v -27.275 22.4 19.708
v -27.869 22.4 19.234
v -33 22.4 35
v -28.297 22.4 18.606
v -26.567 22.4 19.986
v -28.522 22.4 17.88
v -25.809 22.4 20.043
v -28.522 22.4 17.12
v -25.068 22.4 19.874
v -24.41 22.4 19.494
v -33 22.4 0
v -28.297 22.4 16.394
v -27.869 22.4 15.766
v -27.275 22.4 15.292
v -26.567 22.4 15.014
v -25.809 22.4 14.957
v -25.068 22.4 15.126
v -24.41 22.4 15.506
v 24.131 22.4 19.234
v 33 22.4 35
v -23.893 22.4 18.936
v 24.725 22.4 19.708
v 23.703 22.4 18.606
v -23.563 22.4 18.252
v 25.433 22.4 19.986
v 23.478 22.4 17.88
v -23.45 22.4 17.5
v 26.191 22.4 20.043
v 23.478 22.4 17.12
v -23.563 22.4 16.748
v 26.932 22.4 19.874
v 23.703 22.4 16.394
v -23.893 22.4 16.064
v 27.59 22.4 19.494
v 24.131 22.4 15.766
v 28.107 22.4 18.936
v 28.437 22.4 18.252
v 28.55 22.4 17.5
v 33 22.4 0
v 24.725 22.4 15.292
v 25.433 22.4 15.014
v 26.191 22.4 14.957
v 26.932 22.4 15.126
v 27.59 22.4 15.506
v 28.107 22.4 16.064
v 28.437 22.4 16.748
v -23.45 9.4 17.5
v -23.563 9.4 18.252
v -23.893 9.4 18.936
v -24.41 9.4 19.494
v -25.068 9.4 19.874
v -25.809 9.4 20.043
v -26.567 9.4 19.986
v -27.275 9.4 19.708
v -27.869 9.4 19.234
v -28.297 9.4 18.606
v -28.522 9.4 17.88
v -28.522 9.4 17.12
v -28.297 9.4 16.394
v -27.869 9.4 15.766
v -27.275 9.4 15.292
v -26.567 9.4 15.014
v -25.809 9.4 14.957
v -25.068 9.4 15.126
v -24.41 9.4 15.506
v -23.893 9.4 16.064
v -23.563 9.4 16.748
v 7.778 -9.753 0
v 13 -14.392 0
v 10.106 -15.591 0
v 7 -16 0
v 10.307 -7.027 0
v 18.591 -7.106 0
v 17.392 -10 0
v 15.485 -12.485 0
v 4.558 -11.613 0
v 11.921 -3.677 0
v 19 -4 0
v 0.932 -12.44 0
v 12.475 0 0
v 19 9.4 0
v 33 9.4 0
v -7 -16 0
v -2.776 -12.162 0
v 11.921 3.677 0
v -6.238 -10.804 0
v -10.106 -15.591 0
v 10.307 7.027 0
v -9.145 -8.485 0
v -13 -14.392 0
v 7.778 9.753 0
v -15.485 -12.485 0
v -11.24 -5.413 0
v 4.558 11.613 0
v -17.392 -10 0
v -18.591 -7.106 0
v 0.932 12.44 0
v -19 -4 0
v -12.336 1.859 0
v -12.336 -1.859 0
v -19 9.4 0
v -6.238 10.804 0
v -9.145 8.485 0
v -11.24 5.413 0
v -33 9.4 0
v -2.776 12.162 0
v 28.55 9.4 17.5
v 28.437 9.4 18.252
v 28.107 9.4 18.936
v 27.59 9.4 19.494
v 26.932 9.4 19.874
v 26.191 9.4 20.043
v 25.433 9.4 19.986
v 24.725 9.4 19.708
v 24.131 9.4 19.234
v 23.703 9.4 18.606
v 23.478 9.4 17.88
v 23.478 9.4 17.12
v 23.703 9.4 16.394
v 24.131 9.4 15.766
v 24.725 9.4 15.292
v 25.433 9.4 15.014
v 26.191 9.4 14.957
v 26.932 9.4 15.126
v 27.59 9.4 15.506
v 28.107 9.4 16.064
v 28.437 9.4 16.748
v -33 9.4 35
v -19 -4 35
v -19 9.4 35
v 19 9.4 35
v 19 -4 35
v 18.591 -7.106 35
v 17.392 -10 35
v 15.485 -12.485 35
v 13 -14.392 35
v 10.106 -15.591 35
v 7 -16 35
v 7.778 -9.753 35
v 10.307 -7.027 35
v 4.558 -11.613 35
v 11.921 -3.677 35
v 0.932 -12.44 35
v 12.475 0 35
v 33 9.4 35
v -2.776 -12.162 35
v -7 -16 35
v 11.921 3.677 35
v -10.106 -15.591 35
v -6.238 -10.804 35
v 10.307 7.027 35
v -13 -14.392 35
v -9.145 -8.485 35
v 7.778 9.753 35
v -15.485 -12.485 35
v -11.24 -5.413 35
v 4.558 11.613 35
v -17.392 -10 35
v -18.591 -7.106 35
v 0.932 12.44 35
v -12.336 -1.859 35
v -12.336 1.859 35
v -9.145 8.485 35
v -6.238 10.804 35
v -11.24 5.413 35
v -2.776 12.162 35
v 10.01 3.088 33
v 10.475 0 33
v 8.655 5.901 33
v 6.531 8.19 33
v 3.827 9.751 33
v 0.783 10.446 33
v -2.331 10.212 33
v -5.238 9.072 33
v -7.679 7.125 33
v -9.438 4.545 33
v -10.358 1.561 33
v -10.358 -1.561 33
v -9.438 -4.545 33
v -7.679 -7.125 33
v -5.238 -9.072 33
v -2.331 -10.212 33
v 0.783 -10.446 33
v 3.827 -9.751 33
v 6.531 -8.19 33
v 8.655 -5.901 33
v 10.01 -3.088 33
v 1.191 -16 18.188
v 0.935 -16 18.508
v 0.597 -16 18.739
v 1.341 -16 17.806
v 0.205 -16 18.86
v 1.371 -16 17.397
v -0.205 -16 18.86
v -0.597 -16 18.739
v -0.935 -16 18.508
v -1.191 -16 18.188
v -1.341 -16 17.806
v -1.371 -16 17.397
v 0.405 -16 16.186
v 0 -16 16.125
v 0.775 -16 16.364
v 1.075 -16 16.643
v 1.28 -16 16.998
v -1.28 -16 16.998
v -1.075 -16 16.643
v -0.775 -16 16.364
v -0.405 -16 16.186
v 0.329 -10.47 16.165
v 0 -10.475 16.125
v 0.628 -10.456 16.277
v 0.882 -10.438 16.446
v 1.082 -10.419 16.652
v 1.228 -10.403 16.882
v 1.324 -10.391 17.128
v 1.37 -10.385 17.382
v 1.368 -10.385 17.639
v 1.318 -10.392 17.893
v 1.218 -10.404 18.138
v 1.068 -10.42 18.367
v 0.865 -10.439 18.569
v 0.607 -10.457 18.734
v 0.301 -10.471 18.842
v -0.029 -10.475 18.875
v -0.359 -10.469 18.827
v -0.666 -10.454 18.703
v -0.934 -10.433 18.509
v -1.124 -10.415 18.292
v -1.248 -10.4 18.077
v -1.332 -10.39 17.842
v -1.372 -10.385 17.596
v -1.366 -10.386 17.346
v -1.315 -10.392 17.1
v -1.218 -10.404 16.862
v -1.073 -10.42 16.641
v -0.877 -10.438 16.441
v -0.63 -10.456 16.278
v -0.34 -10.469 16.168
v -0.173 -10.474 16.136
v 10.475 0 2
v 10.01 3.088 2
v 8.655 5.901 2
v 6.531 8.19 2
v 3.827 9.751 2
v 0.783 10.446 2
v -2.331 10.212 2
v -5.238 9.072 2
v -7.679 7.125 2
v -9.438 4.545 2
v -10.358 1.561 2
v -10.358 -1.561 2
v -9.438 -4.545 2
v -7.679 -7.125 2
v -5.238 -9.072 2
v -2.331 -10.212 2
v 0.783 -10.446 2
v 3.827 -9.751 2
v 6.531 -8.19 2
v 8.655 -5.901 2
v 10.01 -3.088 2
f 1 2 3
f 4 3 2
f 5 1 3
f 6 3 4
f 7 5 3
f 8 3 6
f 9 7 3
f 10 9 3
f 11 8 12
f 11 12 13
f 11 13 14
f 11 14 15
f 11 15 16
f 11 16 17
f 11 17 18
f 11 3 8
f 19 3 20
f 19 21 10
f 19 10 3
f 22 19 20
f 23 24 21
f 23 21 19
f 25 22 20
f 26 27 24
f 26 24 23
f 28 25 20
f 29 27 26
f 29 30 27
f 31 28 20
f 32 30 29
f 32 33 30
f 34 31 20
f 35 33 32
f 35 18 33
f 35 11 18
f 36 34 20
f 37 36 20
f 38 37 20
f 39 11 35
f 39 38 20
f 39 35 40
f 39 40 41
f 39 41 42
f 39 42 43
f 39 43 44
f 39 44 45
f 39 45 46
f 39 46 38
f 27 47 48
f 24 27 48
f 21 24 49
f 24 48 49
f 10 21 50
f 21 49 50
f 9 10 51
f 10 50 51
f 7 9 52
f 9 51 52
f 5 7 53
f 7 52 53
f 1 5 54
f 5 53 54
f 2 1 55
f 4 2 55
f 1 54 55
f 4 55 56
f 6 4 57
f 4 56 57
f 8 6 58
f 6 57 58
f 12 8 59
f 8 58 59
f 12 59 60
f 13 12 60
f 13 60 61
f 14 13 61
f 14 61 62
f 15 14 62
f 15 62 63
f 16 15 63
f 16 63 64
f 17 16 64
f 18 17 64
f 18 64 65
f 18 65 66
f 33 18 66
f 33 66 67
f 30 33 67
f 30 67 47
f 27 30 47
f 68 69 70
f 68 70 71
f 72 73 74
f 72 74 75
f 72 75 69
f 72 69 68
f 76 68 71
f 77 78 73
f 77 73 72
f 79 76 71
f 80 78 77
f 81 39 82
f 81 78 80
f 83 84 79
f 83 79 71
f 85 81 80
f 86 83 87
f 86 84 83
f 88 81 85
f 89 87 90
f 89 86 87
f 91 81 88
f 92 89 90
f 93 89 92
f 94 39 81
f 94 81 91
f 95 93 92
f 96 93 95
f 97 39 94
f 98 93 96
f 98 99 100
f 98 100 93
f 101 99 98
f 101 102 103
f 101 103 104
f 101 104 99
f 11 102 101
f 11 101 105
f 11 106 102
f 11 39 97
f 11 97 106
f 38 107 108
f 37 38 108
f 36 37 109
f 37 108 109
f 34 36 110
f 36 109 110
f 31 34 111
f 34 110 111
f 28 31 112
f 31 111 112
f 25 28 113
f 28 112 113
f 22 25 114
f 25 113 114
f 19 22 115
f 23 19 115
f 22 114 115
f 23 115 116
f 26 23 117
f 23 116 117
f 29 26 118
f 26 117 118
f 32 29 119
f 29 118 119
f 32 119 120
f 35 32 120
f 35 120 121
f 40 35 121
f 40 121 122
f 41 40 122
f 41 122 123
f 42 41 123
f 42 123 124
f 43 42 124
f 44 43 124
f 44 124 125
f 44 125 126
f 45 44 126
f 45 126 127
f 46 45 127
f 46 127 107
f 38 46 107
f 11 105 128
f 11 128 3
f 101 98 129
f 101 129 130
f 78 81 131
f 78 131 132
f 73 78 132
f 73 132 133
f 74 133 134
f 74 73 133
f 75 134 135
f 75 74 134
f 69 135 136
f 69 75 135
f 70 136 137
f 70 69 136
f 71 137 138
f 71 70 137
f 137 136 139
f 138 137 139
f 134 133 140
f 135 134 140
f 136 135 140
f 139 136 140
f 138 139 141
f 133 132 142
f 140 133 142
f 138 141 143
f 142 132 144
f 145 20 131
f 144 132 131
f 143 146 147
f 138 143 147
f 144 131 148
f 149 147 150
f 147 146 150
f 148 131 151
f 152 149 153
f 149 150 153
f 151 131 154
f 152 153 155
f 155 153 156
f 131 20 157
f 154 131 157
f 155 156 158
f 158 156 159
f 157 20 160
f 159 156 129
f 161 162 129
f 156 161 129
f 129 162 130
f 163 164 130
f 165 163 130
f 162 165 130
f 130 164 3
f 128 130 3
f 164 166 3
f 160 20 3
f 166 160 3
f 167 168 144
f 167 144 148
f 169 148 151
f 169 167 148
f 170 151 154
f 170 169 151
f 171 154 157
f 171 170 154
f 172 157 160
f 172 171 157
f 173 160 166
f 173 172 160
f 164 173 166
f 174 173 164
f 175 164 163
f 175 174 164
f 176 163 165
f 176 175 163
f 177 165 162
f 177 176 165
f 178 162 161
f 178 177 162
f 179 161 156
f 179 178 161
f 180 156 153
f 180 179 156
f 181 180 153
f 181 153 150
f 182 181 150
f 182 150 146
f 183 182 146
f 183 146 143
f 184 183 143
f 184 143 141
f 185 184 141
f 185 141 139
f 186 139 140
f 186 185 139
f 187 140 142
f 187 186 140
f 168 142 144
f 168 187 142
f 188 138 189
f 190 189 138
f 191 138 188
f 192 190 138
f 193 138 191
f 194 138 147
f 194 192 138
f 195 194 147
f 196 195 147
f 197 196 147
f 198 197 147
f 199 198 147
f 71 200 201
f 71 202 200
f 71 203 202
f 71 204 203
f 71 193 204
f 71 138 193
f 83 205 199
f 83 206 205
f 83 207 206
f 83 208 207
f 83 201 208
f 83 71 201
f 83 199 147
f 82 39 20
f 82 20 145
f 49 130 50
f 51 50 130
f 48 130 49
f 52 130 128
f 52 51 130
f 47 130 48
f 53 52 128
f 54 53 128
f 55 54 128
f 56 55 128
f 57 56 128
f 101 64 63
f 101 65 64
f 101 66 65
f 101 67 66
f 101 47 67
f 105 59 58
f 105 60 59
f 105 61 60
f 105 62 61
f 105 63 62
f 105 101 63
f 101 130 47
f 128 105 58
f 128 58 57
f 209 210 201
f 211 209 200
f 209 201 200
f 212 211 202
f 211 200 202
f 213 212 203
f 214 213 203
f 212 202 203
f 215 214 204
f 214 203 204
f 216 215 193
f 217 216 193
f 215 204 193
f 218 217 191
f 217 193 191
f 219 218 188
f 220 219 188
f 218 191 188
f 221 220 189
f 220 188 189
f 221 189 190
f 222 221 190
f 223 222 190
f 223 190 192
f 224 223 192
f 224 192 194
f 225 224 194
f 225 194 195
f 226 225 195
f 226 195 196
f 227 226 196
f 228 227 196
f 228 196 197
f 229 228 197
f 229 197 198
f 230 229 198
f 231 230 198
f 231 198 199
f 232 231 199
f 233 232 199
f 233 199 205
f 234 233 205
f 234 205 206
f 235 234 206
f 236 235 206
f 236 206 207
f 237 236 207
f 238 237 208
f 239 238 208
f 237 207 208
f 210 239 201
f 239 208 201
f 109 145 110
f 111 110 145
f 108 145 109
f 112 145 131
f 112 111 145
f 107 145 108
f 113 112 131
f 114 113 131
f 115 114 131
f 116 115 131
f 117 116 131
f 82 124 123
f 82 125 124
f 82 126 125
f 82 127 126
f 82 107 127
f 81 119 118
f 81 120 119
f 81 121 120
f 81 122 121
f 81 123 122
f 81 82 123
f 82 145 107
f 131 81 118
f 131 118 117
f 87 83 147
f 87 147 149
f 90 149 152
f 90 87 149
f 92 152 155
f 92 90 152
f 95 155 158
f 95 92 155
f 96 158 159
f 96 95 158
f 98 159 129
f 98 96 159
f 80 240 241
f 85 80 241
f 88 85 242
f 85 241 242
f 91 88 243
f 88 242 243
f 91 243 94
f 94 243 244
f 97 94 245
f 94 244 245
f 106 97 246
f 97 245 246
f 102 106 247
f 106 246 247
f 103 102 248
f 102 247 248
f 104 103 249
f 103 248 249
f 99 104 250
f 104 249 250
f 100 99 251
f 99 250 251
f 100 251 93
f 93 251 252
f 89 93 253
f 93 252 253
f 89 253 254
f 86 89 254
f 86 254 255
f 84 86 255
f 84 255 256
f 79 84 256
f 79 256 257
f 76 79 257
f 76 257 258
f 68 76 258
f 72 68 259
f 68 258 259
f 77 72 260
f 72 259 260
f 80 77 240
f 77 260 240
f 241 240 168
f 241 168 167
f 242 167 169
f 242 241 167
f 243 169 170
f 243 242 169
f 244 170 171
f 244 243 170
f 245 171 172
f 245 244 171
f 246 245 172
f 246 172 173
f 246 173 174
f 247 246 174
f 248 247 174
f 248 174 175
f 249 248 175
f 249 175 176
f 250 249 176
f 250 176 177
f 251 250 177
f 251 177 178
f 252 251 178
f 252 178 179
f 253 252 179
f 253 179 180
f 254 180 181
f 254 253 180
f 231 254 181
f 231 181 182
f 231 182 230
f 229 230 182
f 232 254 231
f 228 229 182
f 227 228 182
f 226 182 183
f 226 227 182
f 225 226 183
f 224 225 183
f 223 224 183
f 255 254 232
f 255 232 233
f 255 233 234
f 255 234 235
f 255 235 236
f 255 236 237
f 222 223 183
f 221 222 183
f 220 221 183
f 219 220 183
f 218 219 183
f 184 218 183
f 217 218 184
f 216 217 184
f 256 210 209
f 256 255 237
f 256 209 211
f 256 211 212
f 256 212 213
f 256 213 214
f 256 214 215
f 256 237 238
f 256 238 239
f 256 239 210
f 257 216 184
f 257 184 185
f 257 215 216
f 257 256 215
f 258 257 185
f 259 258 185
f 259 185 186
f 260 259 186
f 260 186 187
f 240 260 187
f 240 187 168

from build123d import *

# Parameters (mm, degrees)
CROQUIS1_R                 = 10.475
SALIENTE_EXTRUIR1_DEPTH    = 35
CROQUIS2_R                 = 2.55
CORTAR_EXTRUIR1_DEPTH      = 55.398161734
CHAFL_N1_SIZE              = 2
CORTAR_EXTRUIR2_REACH      = 63.551
CORTAR_EXTRUIR2_END_RADIUS = 10.475
CROQUIS3_R                 = 1.375


with BuildPart() as part:
    # Croquis1 → Saliente-Extruir1 (new body)
    with BuildSketch(Plane.XY):
        with BuildLine():
            Line((-33, 22.4), (33, 22.4))
            Line((33, 22.4), (33, 9.4))
            Line((33, 9.4), (19, 9.4))
            Line((19, 9.4), (19, -4))
            ThreePointArc((19, -4), (15.485281374, -12.485281374), (7, -16))
            Line((7, -16), (-7, -16))
            ThreePointArc((-7, -16), (-15.485281374, -12.485281374), (-19, -4))
            Line((-19, -4), (-19, 9.4))
            Line((-19, 9.4), (-33, 9.4))
            Line((-33, 9.4), (-33, 22.4))
        make_face()
        Circle(CROQUIS1_R, mode=Mode.SUBTRACT)
    extrude(amount=SALIENTE_EXTRUIR1_DEPTH)

    # Croquis2 → Cortar-Extruir1 (cut, through all)
    with BuildSketch(Plane.XZ.offset(-9.4)):
        with Locations((-26, 17.5)):
            Circle(CROQUIS2_R)
        with Locations((26, 17.5)):
            Circle(CROQUIS2_R)
    extrude(amount=-CORTAR_EXTRUIR1_DEPTH, mode=Mode.SUBTRACT)

    # Chaflán1
    chafl_n1_edges = [part.edges().sort_by_distance(p)[0] for p in [
        (-10.475, 0, 0),
        (-10.475, 0, 35),
    ]]
    chamfer(chafl_n1_edges, length=CHAFL_N1_SIZE)

    # Cortar-Extruir2: up to this cylinder (the profile starts outside it)
    cortar_extruir2_end = Plane(origin=(0, 0, 17.5), z_dir=(0, 0, -1)) * Cylinder(CORTAR_EXTRUIR2_END_RADIUS, 149.052, mode=Mode.PRIVATE)
    # Croquis3 → Cortar-Extruir2 (cut, up to the surface)
    with BuildSketch(Plane.XZ.offset(16), mode=Mode.PRIVATE) as cortar_extruir2_sk1:
        with Locations(Location((0, 17.5, 0), (0, 0, 270))):
            Circle(CROQUIS3_R)
    cortar_extruir2_tool1 = extrude(cortar_extruir2_sk1.sketch, amount=-CORTAR_EXTRUIR2_REACH, mode=Mode.PRIVATE) - cortar_extruir2_end
    add(cortar_extruir2_tool1.solids().sort_by_distance((0, -16, 17.5))[0], mode=Mode.SUBTRACT)


solid = part.part
